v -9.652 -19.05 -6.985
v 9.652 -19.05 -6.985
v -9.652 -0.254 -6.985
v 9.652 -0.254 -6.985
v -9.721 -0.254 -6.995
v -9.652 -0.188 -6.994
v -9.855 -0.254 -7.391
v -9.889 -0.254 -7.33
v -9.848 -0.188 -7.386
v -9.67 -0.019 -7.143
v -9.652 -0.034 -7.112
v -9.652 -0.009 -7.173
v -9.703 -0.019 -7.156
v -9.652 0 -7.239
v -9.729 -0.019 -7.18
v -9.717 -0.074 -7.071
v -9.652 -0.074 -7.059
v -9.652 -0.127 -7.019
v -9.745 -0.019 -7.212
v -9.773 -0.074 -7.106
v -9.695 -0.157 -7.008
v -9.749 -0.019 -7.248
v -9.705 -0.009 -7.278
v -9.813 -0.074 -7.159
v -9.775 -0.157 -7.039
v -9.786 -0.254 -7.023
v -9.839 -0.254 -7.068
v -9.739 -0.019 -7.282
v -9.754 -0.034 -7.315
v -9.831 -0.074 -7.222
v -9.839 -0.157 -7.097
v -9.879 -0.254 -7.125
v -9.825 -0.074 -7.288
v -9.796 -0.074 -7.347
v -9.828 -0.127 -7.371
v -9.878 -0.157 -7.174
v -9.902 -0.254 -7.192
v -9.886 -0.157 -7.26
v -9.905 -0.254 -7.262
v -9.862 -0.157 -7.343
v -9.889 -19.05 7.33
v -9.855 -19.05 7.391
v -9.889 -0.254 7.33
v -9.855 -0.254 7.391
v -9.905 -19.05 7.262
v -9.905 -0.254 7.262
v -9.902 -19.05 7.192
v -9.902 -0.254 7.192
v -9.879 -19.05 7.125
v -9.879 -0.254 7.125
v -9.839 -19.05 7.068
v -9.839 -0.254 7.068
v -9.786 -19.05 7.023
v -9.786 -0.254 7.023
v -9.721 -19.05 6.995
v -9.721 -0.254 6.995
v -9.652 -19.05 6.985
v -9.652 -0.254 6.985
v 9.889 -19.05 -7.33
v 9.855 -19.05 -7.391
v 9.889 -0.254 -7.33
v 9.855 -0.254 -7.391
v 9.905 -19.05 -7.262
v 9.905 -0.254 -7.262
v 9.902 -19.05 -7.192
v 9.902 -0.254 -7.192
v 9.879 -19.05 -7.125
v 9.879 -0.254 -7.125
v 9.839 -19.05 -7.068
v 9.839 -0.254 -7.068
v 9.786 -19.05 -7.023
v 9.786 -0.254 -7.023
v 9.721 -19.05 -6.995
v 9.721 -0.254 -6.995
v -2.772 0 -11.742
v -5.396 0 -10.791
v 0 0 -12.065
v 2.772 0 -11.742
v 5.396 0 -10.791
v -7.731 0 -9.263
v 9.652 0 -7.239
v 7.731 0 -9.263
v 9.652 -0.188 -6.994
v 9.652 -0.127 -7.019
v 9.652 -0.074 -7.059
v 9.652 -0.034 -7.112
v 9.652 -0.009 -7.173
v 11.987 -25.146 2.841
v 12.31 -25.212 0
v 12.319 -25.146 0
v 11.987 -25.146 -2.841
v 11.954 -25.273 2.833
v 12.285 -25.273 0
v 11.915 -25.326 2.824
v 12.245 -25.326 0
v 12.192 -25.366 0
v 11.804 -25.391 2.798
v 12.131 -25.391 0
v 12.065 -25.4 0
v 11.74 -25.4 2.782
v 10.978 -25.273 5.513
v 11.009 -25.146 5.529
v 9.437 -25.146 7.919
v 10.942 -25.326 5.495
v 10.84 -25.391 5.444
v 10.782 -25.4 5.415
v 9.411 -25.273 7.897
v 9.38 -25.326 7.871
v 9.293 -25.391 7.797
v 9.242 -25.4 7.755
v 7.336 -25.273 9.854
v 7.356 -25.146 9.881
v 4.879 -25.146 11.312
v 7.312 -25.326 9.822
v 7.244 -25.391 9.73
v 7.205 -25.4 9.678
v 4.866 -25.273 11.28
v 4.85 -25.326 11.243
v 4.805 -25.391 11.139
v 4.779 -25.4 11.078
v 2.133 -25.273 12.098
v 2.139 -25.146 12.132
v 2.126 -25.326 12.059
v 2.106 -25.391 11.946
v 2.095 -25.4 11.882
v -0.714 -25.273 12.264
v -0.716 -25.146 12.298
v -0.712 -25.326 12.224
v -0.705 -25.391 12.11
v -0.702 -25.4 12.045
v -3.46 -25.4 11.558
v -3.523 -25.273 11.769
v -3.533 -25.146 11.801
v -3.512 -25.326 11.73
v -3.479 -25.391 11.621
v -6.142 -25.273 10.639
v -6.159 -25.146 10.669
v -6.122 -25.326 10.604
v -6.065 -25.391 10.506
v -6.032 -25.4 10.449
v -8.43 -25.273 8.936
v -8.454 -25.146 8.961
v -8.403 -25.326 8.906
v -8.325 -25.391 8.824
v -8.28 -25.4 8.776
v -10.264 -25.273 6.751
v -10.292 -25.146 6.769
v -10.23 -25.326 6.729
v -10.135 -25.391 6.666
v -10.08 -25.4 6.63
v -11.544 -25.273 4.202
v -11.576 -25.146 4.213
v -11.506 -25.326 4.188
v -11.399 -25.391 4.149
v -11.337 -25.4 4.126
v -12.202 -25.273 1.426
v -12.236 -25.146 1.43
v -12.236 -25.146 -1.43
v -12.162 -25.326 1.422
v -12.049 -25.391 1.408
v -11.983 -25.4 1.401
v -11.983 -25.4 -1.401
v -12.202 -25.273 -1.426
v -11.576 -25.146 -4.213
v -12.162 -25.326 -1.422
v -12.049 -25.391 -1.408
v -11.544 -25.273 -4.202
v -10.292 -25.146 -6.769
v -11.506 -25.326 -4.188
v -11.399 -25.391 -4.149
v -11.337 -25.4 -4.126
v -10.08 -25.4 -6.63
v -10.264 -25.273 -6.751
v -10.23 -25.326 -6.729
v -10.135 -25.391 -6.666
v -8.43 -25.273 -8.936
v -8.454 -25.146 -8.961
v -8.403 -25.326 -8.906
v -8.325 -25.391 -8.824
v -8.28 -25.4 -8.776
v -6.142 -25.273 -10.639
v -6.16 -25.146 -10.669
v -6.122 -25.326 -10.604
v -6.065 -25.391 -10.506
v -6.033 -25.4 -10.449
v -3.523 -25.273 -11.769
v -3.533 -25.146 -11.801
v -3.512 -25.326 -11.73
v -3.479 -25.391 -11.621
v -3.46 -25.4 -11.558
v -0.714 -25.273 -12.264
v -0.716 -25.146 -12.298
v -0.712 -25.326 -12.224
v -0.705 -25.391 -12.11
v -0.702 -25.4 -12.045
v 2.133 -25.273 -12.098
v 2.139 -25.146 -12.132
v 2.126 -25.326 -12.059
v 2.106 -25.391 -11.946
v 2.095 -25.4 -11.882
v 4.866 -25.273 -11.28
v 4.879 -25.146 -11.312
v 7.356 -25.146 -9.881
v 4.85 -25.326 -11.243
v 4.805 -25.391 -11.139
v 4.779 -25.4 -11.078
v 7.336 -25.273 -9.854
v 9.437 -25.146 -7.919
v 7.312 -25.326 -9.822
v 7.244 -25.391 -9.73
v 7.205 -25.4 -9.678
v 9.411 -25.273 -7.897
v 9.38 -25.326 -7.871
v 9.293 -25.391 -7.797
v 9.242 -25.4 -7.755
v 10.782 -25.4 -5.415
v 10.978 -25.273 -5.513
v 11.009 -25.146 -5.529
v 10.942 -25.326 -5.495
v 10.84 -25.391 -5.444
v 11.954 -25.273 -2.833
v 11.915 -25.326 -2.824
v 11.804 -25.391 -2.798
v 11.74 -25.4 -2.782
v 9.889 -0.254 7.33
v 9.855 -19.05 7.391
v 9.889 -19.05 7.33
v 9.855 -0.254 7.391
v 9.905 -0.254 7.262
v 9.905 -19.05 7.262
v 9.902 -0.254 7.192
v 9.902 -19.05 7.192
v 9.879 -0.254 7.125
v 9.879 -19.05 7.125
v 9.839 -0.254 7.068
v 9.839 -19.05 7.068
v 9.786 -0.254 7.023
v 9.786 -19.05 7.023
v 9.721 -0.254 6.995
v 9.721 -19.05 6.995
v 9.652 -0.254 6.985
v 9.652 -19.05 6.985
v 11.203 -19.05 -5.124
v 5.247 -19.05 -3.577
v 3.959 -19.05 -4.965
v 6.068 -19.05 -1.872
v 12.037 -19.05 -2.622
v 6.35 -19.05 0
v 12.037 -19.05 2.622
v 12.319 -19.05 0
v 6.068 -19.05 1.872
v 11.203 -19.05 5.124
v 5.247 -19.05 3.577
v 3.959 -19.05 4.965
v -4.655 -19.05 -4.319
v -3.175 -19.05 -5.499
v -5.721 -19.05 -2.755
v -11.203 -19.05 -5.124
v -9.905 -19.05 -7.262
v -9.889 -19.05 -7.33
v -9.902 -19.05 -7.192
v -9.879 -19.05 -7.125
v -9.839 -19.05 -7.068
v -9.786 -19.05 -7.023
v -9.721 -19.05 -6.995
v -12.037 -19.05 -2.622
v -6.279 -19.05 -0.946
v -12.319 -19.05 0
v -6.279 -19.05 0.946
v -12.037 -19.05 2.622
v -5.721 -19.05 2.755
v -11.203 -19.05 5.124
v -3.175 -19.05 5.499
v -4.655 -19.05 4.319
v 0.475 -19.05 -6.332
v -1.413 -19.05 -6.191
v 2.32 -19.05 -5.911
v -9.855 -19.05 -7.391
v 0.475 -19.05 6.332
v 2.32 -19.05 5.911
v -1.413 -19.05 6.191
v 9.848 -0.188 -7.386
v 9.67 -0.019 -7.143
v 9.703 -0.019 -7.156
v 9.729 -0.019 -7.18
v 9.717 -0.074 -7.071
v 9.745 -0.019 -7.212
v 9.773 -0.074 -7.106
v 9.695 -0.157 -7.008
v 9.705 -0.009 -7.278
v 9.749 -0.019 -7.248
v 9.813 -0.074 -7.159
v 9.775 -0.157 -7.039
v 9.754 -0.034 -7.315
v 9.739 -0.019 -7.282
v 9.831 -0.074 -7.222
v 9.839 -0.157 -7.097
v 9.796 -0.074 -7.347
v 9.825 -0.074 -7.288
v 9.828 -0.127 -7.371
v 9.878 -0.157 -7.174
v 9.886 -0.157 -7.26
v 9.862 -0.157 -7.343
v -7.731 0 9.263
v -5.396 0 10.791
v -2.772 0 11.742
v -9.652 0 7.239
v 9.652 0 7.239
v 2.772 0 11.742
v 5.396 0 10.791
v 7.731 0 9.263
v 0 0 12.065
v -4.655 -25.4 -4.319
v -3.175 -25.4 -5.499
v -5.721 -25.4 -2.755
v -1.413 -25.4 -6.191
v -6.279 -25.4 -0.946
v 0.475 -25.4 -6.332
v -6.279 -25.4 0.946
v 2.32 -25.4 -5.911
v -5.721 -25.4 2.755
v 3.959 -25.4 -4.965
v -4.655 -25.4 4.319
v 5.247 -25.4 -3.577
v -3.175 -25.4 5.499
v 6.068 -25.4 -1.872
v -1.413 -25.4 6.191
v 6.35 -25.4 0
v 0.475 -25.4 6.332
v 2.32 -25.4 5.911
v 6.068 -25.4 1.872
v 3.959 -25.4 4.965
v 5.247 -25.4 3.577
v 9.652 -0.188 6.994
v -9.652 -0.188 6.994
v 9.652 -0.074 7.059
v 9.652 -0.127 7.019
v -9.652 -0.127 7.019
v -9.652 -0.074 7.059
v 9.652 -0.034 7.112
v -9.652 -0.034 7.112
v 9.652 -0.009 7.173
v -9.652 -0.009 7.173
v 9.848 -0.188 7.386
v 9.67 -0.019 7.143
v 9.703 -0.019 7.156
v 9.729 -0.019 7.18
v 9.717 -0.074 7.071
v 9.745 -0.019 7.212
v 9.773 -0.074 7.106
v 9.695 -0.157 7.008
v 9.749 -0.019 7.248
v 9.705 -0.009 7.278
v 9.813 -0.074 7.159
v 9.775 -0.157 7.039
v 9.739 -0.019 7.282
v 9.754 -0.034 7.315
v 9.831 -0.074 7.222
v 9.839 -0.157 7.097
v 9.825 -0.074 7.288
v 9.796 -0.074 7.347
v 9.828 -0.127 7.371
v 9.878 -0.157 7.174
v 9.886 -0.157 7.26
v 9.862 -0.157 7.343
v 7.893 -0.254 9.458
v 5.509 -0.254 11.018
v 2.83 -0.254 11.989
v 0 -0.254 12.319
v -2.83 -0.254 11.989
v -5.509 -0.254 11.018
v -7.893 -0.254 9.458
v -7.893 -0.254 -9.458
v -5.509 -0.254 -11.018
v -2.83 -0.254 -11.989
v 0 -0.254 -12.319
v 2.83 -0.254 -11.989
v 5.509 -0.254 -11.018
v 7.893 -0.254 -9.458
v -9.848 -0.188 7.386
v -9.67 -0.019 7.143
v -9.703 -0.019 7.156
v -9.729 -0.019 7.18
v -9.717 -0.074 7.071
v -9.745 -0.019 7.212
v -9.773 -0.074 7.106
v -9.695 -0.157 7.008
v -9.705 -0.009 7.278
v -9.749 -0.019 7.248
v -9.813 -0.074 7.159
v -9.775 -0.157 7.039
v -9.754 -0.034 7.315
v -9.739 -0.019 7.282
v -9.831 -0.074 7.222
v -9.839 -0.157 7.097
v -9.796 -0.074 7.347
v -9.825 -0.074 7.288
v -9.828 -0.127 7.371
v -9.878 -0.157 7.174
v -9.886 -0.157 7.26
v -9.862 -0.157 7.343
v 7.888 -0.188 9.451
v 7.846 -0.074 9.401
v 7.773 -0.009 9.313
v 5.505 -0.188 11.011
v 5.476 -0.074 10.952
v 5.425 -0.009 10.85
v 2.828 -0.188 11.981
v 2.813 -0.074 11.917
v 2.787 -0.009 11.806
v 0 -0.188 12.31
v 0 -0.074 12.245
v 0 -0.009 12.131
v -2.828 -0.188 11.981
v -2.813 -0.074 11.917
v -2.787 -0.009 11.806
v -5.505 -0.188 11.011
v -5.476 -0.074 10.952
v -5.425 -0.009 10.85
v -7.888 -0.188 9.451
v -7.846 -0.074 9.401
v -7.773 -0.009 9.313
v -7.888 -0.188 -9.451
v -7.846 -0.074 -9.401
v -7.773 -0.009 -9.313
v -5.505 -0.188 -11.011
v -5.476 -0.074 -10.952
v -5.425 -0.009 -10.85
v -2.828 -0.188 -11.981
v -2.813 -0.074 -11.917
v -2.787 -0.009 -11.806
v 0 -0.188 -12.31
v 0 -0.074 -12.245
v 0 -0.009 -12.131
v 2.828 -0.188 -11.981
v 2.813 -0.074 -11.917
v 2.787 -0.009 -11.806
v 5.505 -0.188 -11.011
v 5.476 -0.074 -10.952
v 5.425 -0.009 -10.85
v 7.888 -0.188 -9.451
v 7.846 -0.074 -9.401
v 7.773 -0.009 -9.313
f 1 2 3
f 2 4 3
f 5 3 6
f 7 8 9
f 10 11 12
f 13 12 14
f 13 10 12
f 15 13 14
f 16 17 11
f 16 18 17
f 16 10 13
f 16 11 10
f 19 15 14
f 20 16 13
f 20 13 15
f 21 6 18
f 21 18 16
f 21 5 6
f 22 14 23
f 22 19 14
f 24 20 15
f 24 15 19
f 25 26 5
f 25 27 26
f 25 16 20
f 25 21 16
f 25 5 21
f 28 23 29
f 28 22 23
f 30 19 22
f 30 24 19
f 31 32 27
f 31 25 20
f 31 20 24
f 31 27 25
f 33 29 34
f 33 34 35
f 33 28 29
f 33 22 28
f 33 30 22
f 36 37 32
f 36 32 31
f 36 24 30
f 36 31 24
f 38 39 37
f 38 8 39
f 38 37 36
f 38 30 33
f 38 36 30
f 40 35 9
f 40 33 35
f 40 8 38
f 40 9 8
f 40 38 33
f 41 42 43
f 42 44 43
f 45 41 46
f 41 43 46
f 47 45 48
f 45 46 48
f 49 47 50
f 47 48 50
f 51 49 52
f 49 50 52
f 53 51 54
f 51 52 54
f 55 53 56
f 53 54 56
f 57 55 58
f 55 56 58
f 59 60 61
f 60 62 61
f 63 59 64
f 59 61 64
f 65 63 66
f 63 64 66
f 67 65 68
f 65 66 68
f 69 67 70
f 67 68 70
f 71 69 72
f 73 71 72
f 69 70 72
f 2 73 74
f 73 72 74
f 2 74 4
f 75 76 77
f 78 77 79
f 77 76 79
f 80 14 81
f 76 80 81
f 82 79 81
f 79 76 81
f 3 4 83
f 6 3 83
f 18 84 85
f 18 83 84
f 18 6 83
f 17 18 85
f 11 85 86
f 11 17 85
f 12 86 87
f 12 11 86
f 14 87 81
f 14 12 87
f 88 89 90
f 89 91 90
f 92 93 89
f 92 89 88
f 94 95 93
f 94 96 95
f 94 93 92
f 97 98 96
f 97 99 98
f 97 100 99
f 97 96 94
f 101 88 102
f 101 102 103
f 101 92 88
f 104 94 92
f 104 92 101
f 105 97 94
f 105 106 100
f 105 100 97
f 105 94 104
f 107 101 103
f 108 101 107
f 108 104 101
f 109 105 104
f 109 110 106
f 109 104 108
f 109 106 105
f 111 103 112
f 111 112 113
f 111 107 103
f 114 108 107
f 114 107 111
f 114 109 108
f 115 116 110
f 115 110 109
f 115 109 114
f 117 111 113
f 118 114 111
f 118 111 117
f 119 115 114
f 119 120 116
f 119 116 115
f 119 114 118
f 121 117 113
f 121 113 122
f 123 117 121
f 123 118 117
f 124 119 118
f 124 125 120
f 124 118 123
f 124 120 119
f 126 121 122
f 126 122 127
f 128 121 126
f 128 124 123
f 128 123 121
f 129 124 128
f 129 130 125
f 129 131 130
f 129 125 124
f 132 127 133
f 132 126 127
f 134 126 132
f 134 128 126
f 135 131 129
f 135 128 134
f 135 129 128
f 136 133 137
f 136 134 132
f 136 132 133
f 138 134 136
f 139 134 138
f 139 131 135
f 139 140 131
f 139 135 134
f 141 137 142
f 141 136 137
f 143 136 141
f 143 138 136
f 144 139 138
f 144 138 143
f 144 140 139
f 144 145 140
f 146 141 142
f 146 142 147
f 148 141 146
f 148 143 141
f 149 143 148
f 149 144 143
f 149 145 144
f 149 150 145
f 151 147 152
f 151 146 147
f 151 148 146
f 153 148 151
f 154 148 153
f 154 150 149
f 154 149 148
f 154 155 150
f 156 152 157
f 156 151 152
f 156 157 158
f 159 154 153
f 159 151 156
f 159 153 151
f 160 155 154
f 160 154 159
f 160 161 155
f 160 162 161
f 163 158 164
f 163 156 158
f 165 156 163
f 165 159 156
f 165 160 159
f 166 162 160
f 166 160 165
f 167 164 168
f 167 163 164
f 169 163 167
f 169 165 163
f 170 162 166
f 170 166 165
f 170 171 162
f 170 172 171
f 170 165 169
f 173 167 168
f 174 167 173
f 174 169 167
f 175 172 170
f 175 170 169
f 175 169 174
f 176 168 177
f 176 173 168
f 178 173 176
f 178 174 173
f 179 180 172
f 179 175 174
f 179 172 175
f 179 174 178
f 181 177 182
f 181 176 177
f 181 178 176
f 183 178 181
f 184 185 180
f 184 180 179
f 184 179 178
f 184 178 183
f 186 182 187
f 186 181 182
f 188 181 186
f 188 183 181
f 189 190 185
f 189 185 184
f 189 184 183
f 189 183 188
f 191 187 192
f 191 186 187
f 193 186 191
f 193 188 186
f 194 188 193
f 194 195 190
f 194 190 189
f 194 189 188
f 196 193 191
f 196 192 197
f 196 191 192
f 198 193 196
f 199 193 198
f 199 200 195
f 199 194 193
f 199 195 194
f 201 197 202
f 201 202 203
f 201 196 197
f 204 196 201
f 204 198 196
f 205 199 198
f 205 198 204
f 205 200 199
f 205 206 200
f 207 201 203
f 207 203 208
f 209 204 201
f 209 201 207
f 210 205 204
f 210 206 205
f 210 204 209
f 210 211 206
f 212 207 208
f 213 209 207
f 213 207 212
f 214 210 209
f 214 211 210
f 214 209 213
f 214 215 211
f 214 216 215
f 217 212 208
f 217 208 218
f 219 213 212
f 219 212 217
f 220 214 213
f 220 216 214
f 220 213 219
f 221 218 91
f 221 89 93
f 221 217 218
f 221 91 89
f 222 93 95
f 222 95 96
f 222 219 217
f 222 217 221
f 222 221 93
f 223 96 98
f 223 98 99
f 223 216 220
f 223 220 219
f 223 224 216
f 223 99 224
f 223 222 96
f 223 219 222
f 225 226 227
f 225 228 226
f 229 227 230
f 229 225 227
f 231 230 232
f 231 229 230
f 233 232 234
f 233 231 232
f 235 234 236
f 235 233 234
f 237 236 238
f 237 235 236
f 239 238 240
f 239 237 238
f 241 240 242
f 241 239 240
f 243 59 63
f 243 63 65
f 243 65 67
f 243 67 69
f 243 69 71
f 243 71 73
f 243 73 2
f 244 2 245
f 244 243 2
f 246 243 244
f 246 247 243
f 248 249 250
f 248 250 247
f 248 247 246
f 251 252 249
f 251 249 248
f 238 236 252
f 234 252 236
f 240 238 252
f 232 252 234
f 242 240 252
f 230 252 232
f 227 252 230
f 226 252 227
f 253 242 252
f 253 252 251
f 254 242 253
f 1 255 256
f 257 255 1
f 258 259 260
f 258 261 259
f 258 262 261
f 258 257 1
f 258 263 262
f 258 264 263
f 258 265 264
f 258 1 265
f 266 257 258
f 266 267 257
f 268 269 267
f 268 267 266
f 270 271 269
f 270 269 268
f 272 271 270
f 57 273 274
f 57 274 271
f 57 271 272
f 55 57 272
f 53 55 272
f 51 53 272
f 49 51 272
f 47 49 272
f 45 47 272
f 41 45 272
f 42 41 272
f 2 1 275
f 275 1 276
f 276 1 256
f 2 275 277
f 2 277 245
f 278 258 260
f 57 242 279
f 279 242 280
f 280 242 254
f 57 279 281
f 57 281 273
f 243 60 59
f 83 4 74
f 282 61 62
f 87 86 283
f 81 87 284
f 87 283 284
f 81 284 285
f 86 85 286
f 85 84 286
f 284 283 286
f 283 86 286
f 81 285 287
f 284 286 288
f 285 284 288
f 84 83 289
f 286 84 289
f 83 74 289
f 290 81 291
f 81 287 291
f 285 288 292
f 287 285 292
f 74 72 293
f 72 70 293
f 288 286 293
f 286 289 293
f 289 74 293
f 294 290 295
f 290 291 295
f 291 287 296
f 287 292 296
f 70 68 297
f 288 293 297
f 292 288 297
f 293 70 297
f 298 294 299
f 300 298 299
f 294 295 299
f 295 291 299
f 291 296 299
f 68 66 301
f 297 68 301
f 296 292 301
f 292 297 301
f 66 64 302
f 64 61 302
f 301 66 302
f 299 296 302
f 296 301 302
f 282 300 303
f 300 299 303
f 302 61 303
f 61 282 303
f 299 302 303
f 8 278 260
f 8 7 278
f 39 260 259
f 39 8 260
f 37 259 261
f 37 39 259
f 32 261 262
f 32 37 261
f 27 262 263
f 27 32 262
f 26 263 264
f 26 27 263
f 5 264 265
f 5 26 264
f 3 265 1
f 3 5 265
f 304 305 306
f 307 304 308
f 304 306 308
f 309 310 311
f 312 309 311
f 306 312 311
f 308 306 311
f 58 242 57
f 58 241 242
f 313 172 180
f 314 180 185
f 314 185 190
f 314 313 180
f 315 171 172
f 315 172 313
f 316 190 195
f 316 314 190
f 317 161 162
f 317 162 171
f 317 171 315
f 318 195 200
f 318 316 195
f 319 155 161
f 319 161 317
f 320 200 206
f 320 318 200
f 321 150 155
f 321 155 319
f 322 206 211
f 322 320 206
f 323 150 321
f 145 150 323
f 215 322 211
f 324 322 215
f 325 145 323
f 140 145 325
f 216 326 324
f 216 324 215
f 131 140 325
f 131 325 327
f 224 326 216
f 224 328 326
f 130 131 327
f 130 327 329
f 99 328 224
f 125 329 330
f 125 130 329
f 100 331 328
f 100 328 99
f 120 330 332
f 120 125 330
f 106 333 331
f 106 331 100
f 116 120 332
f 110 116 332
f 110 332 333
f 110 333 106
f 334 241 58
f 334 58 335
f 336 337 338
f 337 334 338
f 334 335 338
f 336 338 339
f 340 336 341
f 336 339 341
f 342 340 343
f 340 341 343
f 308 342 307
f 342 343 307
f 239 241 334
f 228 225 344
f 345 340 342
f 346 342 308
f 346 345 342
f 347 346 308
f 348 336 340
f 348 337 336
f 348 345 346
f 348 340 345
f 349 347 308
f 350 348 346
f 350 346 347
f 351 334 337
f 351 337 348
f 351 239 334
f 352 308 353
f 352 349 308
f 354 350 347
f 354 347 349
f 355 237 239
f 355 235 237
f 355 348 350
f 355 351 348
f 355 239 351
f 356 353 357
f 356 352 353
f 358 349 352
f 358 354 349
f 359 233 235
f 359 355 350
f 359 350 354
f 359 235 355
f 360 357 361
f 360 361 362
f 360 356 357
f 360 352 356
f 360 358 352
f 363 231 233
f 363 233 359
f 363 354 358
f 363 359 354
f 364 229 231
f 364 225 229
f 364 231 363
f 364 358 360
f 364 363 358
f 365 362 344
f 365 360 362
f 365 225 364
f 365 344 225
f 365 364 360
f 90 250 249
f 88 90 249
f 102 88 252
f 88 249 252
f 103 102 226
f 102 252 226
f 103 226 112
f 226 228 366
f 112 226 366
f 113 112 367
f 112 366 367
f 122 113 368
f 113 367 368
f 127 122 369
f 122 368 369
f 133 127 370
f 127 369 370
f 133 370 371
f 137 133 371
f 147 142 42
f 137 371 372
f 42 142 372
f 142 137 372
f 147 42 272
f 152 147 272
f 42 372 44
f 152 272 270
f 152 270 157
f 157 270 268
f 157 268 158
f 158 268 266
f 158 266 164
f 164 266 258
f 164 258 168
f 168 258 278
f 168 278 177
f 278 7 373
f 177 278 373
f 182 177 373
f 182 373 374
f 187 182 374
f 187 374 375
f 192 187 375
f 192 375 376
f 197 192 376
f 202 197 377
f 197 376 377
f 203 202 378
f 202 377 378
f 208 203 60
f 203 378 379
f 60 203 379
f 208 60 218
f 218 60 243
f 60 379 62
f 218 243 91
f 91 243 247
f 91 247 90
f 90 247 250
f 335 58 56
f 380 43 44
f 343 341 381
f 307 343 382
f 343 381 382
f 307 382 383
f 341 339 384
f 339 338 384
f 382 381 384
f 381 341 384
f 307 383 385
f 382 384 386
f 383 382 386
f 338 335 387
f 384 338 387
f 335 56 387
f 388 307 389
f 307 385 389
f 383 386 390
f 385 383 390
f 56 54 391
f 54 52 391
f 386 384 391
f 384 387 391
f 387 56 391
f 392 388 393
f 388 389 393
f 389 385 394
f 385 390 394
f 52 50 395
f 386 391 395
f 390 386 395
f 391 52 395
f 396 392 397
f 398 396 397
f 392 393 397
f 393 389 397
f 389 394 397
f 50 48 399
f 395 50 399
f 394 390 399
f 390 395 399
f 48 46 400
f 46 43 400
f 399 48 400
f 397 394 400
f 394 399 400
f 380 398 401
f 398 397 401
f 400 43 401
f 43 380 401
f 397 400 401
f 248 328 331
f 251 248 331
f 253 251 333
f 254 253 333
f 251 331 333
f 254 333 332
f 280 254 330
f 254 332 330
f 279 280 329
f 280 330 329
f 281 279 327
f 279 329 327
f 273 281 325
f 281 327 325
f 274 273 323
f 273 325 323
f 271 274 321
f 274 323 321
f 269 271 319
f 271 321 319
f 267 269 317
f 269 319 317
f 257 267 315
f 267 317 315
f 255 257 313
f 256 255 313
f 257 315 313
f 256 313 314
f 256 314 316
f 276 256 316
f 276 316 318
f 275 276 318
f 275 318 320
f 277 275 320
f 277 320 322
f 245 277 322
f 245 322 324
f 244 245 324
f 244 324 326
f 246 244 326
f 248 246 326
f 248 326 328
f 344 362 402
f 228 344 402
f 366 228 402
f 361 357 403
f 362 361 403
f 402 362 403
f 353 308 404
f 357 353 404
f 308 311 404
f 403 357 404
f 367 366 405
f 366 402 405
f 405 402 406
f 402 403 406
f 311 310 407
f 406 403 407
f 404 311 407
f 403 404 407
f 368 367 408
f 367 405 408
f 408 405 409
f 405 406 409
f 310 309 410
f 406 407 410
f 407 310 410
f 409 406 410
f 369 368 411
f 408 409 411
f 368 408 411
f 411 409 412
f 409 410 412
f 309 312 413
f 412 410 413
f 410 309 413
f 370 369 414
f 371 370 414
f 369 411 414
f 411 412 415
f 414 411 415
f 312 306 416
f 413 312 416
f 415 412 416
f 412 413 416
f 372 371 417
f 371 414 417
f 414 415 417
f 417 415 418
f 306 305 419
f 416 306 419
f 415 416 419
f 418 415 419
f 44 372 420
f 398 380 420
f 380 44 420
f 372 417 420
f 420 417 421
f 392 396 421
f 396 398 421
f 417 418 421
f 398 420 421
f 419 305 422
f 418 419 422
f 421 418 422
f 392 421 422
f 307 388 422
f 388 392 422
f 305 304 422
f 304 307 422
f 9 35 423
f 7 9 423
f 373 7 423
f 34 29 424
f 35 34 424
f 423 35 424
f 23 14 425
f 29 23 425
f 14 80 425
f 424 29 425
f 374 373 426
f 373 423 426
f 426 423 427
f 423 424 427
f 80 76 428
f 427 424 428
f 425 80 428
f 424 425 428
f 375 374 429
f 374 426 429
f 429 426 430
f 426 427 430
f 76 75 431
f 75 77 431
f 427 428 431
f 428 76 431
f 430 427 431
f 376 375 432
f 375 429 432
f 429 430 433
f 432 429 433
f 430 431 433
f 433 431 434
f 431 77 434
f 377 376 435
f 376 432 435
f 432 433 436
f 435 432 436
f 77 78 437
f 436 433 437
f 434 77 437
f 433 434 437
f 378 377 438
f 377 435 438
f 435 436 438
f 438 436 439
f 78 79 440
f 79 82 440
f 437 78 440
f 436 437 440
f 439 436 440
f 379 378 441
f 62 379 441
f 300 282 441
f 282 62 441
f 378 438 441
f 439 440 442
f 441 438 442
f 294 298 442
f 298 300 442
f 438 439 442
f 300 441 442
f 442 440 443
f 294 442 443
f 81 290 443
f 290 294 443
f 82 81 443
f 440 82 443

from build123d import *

# Parameters (mm, degrees)
F0_R     = 12.319
F1_DEPTH = 25.4
F2_W     = 60.442776
F2_H     = 13.97
F3_DEPTH = 19.05
F4_R     = 6.35
F5_DEPTH = 25.4
F6_R     = 0.254


with BuildPart() as f1:
    # F0 (on Front) → F1 (new body)
    with BuildSketch(Plane.XZ):
        Circle(F0_R)
    extrude(amount=F1_DEPTH)

    # F2 (on face) → F3 (cut)
    with BuildSketch(Plane(origin=(0, 0, 0), x_dir=(-1, 0, 0), z_dir=(0, 1, 0))):
        Rectangle(F2_W, F2_H)
    extrude(amount=-F3_DEPTH, mode=Mode.SUBTRACT)

    # F4 (on face) → F5 (cut)
    with BuildSketch(Plane.XZ.offset(25.4)):
        Circle(F4_R)
    extrude(amount=-F5_DEPTH, mode=Mode.SUBTRACT)

    # F6
    f6_edges = [f1.edges().sort_by_distance(p)[0] for p in [
        (10.147292, -9.525, 6.985),
        (-10.147292, -9.525, 6.985),
        (0, 0, 6.985),
        (0, 0, 12.319),
        (0, 0, -12.319),
        (-10.147292, -9.525, -6.985),
        (10.147292, -9.525, -6.985),
        (0, 0, -6.985),
        (-12.319, -25.4, 0),
    ]]
    fillet(f6_edges, radius=F6_R)


solid = f1.part
